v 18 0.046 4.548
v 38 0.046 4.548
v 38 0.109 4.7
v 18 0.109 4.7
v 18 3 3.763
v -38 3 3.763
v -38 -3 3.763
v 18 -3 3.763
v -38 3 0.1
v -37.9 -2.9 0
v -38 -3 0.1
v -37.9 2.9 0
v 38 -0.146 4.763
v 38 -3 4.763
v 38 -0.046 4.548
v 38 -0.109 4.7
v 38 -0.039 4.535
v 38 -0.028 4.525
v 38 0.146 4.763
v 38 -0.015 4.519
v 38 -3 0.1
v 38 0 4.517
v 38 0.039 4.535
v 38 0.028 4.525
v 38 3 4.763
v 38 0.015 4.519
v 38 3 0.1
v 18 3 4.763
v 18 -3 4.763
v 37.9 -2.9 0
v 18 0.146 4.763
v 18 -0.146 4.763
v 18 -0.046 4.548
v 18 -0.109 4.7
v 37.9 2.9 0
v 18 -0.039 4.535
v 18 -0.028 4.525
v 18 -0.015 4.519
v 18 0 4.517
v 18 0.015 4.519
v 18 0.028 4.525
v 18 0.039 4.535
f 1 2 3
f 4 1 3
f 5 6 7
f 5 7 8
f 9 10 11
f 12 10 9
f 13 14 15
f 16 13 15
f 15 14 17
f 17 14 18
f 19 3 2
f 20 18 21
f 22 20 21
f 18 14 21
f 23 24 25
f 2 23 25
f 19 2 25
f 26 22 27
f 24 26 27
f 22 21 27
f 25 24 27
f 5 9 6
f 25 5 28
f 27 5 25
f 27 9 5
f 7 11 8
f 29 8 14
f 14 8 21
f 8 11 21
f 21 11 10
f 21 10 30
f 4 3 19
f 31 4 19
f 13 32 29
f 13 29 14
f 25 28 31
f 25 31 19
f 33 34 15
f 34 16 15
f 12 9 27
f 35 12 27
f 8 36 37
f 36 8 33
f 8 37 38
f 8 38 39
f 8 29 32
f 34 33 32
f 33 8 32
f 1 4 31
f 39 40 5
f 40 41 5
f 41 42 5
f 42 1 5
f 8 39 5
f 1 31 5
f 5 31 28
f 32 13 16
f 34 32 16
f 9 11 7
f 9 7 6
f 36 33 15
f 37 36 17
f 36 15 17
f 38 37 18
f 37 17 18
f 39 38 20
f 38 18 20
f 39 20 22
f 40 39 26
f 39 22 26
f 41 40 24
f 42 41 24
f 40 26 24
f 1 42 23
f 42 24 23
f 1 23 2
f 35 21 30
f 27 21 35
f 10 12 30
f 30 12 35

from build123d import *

# Parameters (mm, degrees)
F0_W     = 76
F0_H     = 6
F1_DEPTH = 7
F2_W     = 76.920286
F2_H     = 6
F3_DEPTH = 2.237
F5_DEPTH = 76.001
F6_SIZE  = 0.1
F7_W     = 58.94864
F7_H     = 6
F8_DEPTH = 1


with BuildPart() as f1:
    # F0 (on Top) → F1 (new body)
    with BuildSketch(Plane.XY):
        Rectangle(F0_W, F0_H)
    extrude(amount=F1_DEPTH)

    # F2 (on face) → F3 (cut)
    with BuildSketch(Plane.XY.offset(7)):
        with Locations((0.460143, 0)):
            Rectangle(F2_W, F2_H)
    extrude(amount=-F3_DEPTH, mode=Mode.SUBTRACT)

    # F4 (on face) → F5 (cut, through all)
    with BuildSketch(Plane.YZ.offset(38)):
        with BuildLine():
            Line((1.437258, 7), (-1.437258, 7))
            Line((-1.437258, 7), (-0.109352, 4.7))
            Line((-0.109352, 4.7), (-0.046194, 4.547522))
            ThreePointArc((-0.046194, 4.547522), (0, 4.516656), (0.046194, 4.547522))
            Line((0.046194, 4.547522), (0.109352, 4.7))
            Line((0.109352, 4.7), (1.437258, 7))
        make_face()
    extrude(amount=-F5_DEPTH, mode=Mode.SUBTRACT)

    # F6
    f6_edges = [f1.edges().sort_by_distance(p)[0] for p in [
        (0, -3, 0),
        (38, 0, 0),
        (0, 3, 0),
        (-38, 0, 0),
        (-38, -1.572863, 4.763),
        (-38, 1.572863, 4.763),
    ]]
    chamfer(f6_edges, length=F6_SIZE)

    # F7 (on face) → F8 (cut)
    with BuildSketch(Plane.XY.offset(4.763)):
        with Locations((-11.47432, 0)):
            Rectangle(F7_W, F7_H)
    extrude(amount=-F8_DEPTH, mode=Mode.SUBTRACT)


solid = f1.part
